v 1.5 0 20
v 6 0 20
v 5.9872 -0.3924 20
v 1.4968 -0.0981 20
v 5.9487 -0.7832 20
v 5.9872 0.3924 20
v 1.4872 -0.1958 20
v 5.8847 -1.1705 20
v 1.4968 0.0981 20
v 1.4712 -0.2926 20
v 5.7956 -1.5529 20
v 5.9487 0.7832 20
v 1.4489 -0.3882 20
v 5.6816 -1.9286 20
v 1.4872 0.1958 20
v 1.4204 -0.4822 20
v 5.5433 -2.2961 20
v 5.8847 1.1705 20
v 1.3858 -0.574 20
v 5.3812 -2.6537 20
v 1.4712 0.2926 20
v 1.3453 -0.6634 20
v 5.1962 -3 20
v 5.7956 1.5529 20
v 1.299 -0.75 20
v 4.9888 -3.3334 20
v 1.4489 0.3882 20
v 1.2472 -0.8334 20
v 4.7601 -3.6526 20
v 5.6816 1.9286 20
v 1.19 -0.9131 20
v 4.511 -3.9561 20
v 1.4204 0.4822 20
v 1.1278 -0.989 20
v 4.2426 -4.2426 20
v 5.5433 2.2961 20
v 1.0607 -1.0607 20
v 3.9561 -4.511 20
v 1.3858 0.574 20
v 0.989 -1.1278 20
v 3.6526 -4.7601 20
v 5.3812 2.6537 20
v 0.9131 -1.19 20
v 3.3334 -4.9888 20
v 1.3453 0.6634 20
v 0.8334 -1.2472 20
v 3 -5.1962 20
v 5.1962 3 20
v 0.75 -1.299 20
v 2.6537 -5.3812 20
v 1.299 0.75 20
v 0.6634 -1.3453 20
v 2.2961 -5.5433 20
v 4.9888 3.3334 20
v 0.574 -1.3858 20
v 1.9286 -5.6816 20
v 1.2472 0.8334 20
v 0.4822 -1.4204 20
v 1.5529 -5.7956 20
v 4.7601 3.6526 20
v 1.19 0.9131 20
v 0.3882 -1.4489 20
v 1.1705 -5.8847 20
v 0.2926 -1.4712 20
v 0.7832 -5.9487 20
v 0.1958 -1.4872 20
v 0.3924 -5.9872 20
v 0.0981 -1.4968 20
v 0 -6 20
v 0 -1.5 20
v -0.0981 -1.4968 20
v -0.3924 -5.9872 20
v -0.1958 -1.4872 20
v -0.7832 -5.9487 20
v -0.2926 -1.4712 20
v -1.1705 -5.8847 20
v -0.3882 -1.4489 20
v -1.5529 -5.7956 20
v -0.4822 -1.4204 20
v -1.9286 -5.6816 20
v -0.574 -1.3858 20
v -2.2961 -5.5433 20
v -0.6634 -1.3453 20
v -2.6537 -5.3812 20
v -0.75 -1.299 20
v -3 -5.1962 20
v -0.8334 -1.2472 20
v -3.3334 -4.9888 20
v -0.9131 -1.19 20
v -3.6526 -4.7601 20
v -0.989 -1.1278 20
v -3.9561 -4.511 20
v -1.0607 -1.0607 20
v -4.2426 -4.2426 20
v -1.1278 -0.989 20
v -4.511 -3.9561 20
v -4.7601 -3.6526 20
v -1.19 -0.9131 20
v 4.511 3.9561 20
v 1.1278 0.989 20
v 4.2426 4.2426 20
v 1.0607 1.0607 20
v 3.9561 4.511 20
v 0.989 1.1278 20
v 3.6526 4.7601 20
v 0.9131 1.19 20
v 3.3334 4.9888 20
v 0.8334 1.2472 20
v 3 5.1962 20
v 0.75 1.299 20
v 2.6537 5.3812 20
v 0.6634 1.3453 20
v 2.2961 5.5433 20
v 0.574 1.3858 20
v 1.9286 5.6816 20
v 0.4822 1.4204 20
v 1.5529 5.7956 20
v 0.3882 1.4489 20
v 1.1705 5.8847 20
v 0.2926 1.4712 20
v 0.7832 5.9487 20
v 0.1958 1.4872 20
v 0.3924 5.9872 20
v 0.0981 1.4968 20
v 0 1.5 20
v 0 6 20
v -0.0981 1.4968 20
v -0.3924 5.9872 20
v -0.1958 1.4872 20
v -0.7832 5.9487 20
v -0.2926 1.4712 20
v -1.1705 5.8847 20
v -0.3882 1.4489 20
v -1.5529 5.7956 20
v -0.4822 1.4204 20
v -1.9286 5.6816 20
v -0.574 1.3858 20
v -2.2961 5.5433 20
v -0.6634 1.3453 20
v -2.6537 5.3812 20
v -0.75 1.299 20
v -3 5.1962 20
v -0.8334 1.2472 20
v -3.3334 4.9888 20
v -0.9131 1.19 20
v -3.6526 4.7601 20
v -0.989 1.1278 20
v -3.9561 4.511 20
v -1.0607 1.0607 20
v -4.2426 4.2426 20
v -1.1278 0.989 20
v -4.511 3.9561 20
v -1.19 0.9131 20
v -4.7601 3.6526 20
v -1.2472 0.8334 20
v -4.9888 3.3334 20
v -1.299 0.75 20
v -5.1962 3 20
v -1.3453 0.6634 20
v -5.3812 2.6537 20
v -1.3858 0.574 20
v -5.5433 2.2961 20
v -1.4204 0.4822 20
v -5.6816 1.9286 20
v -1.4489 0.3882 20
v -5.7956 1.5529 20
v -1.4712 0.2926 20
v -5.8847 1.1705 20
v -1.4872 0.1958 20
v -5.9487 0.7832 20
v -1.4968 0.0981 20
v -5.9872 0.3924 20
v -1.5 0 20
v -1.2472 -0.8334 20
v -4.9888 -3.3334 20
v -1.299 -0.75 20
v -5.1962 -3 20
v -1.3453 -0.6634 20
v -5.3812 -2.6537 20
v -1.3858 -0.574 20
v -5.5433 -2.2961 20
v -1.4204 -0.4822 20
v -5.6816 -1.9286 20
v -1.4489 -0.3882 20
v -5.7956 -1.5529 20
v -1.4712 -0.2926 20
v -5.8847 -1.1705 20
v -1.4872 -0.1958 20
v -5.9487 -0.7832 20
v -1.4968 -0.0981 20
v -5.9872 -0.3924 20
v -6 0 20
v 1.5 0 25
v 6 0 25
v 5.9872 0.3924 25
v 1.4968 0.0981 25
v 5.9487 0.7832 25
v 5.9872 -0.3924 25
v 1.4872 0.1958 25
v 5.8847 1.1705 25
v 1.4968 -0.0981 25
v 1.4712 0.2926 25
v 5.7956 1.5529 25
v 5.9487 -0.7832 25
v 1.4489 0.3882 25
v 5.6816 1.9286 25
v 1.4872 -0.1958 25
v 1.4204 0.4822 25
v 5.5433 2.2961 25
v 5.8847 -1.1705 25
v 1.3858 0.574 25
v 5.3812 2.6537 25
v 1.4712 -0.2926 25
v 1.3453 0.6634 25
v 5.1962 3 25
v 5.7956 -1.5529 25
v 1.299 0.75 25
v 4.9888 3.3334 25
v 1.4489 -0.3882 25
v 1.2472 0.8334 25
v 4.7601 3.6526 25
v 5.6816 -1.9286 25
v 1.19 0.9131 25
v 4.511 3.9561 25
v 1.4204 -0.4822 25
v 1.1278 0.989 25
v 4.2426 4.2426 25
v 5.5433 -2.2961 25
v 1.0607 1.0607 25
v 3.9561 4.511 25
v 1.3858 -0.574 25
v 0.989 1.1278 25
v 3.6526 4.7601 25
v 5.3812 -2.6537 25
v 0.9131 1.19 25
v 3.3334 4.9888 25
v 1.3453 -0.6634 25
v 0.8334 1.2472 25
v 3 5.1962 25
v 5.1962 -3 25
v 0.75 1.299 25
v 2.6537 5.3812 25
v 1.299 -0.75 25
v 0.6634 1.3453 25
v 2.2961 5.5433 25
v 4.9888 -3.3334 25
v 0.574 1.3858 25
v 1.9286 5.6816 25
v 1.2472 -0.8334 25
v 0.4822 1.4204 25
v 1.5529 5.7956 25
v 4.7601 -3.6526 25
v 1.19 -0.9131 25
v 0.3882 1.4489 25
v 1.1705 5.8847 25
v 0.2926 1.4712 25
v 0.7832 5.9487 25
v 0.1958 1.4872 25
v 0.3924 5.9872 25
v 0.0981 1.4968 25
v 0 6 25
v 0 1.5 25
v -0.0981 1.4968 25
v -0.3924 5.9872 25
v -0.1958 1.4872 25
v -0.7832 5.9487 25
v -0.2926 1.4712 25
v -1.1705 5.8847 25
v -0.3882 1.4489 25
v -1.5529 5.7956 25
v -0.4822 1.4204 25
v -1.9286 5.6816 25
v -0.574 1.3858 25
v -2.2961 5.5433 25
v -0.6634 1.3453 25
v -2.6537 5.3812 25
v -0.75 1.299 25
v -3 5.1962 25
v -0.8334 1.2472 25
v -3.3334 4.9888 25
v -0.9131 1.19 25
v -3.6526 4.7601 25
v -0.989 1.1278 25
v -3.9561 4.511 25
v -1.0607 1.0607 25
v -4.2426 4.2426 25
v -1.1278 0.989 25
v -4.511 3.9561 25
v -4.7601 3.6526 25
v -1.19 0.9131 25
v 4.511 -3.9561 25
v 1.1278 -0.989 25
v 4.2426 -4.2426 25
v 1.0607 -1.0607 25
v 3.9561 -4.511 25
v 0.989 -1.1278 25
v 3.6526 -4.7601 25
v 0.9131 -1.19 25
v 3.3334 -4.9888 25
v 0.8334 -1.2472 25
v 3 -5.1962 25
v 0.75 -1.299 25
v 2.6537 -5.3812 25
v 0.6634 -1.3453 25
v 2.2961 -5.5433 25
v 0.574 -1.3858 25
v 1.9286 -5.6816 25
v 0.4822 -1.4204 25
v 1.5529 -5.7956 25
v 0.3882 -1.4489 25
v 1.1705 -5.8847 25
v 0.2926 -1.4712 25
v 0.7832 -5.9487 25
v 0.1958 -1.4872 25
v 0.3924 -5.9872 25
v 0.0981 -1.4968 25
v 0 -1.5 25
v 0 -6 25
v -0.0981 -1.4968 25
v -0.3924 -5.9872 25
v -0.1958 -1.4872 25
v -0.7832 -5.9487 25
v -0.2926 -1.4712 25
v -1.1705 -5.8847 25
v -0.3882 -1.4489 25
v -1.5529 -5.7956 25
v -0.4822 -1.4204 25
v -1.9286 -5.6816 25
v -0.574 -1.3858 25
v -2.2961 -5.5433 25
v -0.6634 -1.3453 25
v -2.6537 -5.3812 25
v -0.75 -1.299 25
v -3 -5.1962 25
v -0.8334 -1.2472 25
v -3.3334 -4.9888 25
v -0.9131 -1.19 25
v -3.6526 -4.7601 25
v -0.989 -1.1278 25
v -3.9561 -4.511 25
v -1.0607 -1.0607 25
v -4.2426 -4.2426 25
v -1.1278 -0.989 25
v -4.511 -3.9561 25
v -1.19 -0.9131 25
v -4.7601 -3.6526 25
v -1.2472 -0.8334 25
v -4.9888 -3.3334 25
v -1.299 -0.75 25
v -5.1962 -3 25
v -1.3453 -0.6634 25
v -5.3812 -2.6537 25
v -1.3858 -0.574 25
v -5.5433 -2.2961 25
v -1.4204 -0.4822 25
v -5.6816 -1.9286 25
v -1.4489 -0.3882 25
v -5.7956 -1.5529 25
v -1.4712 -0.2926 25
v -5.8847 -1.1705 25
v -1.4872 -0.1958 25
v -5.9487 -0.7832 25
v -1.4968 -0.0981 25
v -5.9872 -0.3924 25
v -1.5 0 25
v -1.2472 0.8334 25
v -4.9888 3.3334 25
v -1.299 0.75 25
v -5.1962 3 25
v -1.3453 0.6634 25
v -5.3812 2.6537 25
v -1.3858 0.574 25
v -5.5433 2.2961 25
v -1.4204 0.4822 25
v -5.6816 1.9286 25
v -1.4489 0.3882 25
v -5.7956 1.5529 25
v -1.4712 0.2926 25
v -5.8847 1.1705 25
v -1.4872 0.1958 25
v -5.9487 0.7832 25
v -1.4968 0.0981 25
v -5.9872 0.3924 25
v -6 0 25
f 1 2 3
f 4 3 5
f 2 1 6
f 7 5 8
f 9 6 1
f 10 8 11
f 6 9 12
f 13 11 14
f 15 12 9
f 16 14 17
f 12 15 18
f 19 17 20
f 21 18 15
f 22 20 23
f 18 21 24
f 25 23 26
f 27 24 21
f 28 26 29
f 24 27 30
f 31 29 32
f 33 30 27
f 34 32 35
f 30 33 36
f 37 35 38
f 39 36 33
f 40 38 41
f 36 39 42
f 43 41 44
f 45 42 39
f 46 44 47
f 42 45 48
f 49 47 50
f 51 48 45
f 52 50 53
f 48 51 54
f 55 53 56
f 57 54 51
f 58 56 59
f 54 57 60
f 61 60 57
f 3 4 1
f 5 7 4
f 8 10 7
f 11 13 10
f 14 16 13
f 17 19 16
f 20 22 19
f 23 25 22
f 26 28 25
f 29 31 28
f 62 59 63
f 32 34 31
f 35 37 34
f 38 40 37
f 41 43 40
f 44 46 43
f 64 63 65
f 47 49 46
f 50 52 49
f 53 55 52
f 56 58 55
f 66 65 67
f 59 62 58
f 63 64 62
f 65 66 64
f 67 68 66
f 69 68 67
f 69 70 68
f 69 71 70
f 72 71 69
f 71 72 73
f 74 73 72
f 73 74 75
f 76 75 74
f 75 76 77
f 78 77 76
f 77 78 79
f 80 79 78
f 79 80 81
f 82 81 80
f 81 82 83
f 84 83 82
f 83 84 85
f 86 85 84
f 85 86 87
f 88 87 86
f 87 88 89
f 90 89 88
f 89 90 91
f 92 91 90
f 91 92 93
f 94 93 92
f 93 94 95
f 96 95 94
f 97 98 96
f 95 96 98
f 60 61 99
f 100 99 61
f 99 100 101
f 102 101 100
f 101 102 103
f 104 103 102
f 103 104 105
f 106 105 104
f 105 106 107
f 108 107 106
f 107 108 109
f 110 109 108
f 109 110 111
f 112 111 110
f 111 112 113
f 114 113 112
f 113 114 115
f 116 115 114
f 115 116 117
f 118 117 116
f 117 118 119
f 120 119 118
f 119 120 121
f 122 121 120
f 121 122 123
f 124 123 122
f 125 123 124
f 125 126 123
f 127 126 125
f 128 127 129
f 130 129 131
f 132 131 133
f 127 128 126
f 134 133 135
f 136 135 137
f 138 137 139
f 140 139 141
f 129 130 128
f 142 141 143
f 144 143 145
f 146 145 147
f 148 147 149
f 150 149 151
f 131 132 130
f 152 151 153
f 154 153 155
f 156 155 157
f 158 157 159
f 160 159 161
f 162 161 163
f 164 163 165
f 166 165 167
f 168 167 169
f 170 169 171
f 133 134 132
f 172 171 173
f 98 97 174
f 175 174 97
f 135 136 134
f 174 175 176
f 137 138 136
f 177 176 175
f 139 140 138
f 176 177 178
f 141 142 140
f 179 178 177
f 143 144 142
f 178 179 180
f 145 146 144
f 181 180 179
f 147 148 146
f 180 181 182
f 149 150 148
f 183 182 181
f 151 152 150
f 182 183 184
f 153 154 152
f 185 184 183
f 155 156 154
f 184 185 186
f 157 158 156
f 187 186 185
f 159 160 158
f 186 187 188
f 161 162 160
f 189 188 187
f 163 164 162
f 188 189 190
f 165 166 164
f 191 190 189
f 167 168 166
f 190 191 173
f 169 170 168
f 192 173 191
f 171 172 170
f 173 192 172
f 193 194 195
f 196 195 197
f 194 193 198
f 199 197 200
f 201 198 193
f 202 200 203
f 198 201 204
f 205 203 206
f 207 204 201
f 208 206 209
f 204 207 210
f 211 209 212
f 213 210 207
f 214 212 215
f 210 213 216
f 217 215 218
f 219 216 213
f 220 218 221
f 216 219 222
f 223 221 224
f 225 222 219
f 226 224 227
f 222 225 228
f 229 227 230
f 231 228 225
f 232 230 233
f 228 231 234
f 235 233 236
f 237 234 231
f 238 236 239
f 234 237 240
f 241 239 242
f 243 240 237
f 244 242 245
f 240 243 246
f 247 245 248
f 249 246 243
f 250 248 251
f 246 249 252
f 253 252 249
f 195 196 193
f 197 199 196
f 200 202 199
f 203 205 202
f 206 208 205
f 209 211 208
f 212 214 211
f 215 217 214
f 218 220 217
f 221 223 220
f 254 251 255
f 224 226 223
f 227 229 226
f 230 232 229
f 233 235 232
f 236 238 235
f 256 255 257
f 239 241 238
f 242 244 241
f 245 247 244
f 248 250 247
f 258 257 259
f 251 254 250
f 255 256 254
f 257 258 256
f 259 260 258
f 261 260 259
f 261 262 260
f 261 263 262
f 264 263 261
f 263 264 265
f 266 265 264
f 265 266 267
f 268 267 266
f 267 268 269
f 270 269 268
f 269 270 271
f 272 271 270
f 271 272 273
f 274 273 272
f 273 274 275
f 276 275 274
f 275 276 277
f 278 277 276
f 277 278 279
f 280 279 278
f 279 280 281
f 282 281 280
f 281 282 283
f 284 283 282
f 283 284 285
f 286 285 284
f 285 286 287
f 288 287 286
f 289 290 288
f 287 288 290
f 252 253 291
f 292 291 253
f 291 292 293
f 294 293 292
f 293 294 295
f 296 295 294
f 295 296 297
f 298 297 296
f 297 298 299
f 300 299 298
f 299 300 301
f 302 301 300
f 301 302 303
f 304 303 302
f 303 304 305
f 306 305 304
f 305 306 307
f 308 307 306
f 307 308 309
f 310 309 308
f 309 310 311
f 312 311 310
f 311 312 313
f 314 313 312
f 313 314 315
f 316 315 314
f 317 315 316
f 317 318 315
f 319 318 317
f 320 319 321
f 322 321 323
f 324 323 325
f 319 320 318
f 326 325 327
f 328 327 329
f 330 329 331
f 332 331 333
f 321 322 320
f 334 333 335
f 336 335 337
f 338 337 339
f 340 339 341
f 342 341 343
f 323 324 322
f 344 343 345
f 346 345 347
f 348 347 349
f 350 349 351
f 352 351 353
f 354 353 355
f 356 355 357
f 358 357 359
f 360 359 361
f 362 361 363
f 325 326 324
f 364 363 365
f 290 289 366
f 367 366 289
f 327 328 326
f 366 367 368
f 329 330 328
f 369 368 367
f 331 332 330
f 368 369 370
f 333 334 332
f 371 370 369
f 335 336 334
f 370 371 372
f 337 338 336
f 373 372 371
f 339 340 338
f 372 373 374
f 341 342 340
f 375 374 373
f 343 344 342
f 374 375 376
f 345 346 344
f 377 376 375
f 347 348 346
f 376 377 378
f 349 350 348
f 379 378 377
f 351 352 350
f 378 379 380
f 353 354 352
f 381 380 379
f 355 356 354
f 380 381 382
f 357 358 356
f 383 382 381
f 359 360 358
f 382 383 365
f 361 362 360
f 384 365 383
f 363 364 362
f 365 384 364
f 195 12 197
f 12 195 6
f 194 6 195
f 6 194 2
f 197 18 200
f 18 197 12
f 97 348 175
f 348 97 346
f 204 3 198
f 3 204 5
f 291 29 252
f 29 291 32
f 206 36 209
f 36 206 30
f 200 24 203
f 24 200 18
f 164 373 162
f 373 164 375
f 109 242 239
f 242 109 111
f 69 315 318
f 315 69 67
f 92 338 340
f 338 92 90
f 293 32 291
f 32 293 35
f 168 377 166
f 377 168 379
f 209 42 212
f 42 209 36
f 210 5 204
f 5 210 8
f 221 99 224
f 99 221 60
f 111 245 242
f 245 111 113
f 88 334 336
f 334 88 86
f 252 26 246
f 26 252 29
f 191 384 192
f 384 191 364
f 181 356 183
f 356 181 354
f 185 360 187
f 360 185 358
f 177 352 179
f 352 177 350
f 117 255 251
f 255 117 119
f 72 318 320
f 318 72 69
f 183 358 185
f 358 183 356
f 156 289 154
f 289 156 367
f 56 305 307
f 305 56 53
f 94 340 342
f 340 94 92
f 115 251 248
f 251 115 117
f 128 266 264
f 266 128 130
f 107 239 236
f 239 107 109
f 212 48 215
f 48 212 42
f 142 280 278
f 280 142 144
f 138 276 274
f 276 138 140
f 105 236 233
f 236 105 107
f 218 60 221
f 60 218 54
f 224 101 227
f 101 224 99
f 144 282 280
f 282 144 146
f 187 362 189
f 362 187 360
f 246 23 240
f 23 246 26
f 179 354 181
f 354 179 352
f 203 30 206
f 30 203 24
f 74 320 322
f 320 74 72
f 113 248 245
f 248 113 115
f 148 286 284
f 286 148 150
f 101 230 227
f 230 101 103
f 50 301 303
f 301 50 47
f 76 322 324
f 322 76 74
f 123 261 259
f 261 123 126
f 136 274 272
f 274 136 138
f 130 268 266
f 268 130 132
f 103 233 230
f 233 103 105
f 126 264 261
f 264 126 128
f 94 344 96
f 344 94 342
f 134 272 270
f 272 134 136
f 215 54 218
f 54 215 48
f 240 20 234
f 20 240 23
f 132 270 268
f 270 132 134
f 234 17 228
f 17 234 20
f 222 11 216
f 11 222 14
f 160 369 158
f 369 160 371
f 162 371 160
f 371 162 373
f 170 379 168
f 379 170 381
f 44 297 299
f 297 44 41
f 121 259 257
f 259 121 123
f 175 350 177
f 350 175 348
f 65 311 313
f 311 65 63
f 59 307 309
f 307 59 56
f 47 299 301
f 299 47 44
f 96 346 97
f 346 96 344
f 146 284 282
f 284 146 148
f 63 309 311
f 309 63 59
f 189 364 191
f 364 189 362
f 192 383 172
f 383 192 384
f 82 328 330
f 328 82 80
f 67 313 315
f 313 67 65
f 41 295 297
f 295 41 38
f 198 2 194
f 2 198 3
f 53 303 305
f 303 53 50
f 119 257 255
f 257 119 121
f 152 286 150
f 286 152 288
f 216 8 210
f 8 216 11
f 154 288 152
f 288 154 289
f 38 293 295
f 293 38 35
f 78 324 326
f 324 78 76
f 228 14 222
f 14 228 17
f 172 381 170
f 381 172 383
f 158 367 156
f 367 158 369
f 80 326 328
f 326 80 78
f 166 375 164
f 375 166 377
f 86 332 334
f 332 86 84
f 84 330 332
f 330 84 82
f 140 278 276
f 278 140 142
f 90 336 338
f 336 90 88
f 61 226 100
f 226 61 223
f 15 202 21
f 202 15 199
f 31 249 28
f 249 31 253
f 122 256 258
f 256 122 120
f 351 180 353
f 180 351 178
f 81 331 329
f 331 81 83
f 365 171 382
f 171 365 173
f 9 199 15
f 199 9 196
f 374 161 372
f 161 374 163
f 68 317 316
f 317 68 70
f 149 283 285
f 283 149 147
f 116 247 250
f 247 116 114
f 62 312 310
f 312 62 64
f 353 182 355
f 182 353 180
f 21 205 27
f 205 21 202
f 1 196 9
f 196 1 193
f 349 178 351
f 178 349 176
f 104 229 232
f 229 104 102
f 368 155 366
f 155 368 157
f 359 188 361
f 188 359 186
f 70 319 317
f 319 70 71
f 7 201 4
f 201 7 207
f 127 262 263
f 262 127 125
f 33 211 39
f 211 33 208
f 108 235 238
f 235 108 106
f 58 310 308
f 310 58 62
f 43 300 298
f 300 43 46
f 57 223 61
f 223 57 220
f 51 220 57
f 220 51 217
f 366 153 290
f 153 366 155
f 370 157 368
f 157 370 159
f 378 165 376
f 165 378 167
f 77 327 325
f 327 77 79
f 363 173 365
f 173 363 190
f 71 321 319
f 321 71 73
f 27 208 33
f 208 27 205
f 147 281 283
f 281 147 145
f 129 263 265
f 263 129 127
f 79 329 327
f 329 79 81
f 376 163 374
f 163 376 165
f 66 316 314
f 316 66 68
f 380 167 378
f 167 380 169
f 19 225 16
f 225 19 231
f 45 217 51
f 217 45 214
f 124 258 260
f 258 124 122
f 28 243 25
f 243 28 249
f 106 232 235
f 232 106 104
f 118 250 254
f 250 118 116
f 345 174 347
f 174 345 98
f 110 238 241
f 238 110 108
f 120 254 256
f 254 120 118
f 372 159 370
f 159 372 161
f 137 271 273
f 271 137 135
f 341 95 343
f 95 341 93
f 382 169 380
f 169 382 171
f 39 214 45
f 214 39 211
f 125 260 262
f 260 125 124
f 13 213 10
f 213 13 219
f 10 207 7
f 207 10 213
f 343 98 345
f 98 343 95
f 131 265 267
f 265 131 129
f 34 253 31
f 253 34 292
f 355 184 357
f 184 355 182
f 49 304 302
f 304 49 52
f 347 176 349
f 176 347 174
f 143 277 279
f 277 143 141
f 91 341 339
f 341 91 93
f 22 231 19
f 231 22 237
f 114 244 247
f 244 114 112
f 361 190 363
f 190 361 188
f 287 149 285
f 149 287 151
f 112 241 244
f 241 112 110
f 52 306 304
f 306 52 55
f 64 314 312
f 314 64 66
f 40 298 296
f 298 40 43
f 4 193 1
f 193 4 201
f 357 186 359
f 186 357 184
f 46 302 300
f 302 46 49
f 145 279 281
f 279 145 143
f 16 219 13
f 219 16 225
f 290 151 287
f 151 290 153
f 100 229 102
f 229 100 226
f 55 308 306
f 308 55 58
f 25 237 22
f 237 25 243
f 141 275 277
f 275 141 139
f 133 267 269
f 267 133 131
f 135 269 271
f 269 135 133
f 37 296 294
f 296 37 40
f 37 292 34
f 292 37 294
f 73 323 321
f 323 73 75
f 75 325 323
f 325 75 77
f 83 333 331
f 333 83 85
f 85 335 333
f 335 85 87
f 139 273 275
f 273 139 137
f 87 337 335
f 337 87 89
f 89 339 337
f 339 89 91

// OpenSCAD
// Hose-barb reducer: joins 8 mm tubing to 5 mm tubing
// Print orientation: standing upright along +Z

// ---------------- Parameters ----------------
tube_d1      = 8;    // inner diameter of first (larger) tubing
tube_d2      = 5;    // inner diameter of second (smaller) tubing
bore_d       = 3;    // through-bore diameter
z0           = 0;    // start of first barbs
z1           = 20;   // end of first barbs / start of collar
z2           = 25;   // end of collar / start of second barbs
z3           = 41;   // end of part

barb_h1      = 10;   // height of each 8 mm barb
barb_d1_bot  = 7.5;  // outer diameter of 8 mm barb at bottom
barb_d1_top  = 9.5;  // outer diameter of 8 mm barb at top

barb_h2      = 8;    // height of each 5 mm barb
barb_d2_bot  = 6.5;  // outer diameter of 5 mm barb at bottom
barb_d2_top  = 5.0;  // outer diameter of 5 mm barb at top

eps          = 0.5;  // overshoot for clean boolean cuts
$fn          = 96;   // curve resolution

// ---------------- Derived ----------------
// Wall thickness of a barb at a given height, clamped to a minimum
function wall(h, d_bot, d_top, h_b) = min(max((d_bot + (d_top - d_bot) * h / h_b) - tube_d1, 1.5));

// ---------------- Model ----------------
difference() {
    union() {
        // First section: two stacked barbs for 8 mm tubing
        for (i = [0, 1])
            translate([0, 0, z0 + i * barb_h1])
                linear_extrude(height = barb_h1)
                    circle(d = barb_d1_bot + 2 * wall([0], barb_d1_bot, barb_d1_top, barb_h1));

        // Cylindrical collar
        translate([0, 0, z1])
            cylinder(d = 12, h = z2 - z1);

        // Second section: two stacked barbs for 5 mm tubing
        for (i = [0, 1])
            translate([0, 0, z2 + i * barb_h2])
                linear_extrude(height = barb_h2)
                    circle(d = barb_d2_bot + 2 * wall([0], barb_d2_bot, barb_d2_top, barb_h2));
    }

    // Through-bore
    translate([0, 0, z0 - eps])
        cylinder(d = bore_d, h = z3 - z0 + 2 * eps);
}
